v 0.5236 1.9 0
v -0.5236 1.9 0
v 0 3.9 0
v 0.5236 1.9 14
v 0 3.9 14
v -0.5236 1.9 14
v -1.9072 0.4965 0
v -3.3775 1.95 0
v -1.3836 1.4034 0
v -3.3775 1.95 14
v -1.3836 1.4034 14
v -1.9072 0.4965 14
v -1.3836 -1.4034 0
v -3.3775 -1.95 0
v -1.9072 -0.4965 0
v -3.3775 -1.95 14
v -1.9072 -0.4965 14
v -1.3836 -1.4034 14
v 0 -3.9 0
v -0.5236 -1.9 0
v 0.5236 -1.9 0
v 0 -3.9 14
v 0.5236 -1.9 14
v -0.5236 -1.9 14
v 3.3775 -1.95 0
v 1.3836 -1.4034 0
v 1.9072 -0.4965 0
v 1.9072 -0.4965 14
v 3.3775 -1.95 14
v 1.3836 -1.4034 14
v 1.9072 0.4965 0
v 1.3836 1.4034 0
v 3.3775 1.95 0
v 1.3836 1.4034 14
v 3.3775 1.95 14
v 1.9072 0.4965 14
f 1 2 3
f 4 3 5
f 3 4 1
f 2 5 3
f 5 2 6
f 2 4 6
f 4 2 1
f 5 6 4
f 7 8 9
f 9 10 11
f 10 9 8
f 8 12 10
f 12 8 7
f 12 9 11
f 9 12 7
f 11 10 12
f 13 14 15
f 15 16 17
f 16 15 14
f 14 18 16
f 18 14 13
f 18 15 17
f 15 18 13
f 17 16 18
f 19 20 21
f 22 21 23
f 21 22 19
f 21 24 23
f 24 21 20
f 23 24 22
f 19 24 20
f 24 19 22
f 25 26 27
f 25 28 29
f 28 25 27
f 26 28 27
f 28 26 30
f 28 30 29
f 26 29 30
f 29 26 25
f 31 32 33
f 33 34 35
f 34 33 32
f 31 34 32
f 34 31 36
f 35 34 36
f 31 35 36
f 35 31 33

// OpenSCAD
// (c) 2017 Eryk Makowski <vramin@tiger.com.pl>


module supports(
    height,
    r_top,
    r_bottom,
    size,
    min_distance) 
{
    r_max = max(r_top, r_bottom);
    s_count = ceil(2 * PI * r_max / min_distance);
    h = sin(30)*size;
    bottom_size = min(size,PI*(r_bottom-h)/s_count);
    top_size = min(size,PI*(r_top-h)/s_count);
    a = 360/s_count;
    
    for(i=[0:s_count-1]) {
        rotate([0,0,i*a])
        translate( [0,r_bottom-0.1,0] ) 
        polyhedron(
            points = [
                [0,0,0],
                [-bottom_size/2,-h,0],
                [bottom_size/2,-h,0],
                [0,r_top-r_bottom,height],
                [-top_size/2,r_top-r_bottom-h,height],
                [top_size/2,r_top-r_bottom-h,height]
            ],
            faces = [
                [0,1,2],
                [4,5,2,1],
                [3,4,1,0],
                [0,2,5,3],
                [5,4,3],
            ]);
    }
}



module sleeve(
    height,             // height of sleeve
    r_top_intern,       // top internal radius
    r_top_extern,       // top external radius
    r_bottom_intern,    // bottom internal radius
    r_bottom_extern,    // bottom external radius
    elem_count,         // number of holes in one layer
    elem_border,        // border width
    elem_height,        // layer (element) height
    make_supports       // supports
) {
    if(make_supports) {
        supports(
            height = height,
            r_top = r_top_intern,
            r_bottom = r_bottom_intern,
            size = 4,
            min_distance = 5
        );
    }
    
    elem_a1 = 240;
    elem_a2 = elem_a1 + 360/elem_count;

    elem_a = 360/elem_count;

    layer_count = height/elem_height;

    difference() {
        cylinder(
            h = height,
            r1 = r_bottom_extern,
            r2 = r_top_extern,
            center = false);

        union() {
            translate([0,0,-0.05])
            cylinder(
                h = height+0.1, 
                r1 = r_bottom_intern, 
                r2 = r_top_intern, 
                center = false);
            for(layer_no=[0:(layer_count-1)]) {
                elem_r_extern = r_bottom_extern+layer_no/layer_count*(r_top_extern-r_bottom_extern);
                hole_r = elem_r_extern+10;
                elem_bot_a = 360*elem_border/(2*PI*elem_r_extern);
                elem_z = layer_no*elem_height+elem_border;
                elem_z2 = (layer_no==layer_count-1 ? height : elem_z+elem_height) -elem_border;
                a_offset = layer_no * 180 / elem_count;
                for(i=[0:(elem_count-1)]) {
                    elem_a1 = a_offset + i*elem_a;
                    elem_a2 = elem_a1+elem_a;
                    polyhedron(
                        points = [
                            [0,0,elem_z],
                            [cos(elem_a1)*hole_r,sin(elem_a1)*hole_r,elem_z],
                            [cos(elem_a2-elem_bot_a)*hole_r,sin(elem_a2-elem_bot_a)*hole_r,elem_z],
                            [0,0,elem_z2],
                            [cos(elem_a1)*hole_r,sin(elem_a1)*hole_r,elem_z2],
                            [cos(elem_a2-elem_bot_a)*hole_r,sin(elem_a2-elem_bot_a)*hole_r,elem_z2]
                        ],
                        faces = [
                            [0,1,2],
                            [5,4,3],
                            [3,4,1,0],
                            [2,5,3,0],
                            [4,5,2,1]
                            ]
                            );
                }
            }
        }
    }
}

// EXAMPLE:
/*
sleeve(
    height = 29,                // height of sleeve
    r_top_intern = 4,           // top internal radius
    r_top_extern = 5.5,         // top external radius
    r_bottom_intern = 4,        // bottom internal radius
    r_bottom_extern = 6.5,      // bottom external radius
    elem_count = 3,             // number of holes in one layer
    elem_border = 1,            // border width
    elem_height = 2,            // layer (element) height
    make_supports = true
    );
*/

height = 35;

r_top_intern = 4.5;
r_top_extern = 5.5;
r_bottom_intern = 14.5;
r_bottom_extern = 7.5;
elem_count = 3;
elem_border = 1;
elem_height = 2.5;

supports(
    height = 14,
    r_top = 4,
    r_bottom = 4,
    size = 4,
    min_distance = 5
);
